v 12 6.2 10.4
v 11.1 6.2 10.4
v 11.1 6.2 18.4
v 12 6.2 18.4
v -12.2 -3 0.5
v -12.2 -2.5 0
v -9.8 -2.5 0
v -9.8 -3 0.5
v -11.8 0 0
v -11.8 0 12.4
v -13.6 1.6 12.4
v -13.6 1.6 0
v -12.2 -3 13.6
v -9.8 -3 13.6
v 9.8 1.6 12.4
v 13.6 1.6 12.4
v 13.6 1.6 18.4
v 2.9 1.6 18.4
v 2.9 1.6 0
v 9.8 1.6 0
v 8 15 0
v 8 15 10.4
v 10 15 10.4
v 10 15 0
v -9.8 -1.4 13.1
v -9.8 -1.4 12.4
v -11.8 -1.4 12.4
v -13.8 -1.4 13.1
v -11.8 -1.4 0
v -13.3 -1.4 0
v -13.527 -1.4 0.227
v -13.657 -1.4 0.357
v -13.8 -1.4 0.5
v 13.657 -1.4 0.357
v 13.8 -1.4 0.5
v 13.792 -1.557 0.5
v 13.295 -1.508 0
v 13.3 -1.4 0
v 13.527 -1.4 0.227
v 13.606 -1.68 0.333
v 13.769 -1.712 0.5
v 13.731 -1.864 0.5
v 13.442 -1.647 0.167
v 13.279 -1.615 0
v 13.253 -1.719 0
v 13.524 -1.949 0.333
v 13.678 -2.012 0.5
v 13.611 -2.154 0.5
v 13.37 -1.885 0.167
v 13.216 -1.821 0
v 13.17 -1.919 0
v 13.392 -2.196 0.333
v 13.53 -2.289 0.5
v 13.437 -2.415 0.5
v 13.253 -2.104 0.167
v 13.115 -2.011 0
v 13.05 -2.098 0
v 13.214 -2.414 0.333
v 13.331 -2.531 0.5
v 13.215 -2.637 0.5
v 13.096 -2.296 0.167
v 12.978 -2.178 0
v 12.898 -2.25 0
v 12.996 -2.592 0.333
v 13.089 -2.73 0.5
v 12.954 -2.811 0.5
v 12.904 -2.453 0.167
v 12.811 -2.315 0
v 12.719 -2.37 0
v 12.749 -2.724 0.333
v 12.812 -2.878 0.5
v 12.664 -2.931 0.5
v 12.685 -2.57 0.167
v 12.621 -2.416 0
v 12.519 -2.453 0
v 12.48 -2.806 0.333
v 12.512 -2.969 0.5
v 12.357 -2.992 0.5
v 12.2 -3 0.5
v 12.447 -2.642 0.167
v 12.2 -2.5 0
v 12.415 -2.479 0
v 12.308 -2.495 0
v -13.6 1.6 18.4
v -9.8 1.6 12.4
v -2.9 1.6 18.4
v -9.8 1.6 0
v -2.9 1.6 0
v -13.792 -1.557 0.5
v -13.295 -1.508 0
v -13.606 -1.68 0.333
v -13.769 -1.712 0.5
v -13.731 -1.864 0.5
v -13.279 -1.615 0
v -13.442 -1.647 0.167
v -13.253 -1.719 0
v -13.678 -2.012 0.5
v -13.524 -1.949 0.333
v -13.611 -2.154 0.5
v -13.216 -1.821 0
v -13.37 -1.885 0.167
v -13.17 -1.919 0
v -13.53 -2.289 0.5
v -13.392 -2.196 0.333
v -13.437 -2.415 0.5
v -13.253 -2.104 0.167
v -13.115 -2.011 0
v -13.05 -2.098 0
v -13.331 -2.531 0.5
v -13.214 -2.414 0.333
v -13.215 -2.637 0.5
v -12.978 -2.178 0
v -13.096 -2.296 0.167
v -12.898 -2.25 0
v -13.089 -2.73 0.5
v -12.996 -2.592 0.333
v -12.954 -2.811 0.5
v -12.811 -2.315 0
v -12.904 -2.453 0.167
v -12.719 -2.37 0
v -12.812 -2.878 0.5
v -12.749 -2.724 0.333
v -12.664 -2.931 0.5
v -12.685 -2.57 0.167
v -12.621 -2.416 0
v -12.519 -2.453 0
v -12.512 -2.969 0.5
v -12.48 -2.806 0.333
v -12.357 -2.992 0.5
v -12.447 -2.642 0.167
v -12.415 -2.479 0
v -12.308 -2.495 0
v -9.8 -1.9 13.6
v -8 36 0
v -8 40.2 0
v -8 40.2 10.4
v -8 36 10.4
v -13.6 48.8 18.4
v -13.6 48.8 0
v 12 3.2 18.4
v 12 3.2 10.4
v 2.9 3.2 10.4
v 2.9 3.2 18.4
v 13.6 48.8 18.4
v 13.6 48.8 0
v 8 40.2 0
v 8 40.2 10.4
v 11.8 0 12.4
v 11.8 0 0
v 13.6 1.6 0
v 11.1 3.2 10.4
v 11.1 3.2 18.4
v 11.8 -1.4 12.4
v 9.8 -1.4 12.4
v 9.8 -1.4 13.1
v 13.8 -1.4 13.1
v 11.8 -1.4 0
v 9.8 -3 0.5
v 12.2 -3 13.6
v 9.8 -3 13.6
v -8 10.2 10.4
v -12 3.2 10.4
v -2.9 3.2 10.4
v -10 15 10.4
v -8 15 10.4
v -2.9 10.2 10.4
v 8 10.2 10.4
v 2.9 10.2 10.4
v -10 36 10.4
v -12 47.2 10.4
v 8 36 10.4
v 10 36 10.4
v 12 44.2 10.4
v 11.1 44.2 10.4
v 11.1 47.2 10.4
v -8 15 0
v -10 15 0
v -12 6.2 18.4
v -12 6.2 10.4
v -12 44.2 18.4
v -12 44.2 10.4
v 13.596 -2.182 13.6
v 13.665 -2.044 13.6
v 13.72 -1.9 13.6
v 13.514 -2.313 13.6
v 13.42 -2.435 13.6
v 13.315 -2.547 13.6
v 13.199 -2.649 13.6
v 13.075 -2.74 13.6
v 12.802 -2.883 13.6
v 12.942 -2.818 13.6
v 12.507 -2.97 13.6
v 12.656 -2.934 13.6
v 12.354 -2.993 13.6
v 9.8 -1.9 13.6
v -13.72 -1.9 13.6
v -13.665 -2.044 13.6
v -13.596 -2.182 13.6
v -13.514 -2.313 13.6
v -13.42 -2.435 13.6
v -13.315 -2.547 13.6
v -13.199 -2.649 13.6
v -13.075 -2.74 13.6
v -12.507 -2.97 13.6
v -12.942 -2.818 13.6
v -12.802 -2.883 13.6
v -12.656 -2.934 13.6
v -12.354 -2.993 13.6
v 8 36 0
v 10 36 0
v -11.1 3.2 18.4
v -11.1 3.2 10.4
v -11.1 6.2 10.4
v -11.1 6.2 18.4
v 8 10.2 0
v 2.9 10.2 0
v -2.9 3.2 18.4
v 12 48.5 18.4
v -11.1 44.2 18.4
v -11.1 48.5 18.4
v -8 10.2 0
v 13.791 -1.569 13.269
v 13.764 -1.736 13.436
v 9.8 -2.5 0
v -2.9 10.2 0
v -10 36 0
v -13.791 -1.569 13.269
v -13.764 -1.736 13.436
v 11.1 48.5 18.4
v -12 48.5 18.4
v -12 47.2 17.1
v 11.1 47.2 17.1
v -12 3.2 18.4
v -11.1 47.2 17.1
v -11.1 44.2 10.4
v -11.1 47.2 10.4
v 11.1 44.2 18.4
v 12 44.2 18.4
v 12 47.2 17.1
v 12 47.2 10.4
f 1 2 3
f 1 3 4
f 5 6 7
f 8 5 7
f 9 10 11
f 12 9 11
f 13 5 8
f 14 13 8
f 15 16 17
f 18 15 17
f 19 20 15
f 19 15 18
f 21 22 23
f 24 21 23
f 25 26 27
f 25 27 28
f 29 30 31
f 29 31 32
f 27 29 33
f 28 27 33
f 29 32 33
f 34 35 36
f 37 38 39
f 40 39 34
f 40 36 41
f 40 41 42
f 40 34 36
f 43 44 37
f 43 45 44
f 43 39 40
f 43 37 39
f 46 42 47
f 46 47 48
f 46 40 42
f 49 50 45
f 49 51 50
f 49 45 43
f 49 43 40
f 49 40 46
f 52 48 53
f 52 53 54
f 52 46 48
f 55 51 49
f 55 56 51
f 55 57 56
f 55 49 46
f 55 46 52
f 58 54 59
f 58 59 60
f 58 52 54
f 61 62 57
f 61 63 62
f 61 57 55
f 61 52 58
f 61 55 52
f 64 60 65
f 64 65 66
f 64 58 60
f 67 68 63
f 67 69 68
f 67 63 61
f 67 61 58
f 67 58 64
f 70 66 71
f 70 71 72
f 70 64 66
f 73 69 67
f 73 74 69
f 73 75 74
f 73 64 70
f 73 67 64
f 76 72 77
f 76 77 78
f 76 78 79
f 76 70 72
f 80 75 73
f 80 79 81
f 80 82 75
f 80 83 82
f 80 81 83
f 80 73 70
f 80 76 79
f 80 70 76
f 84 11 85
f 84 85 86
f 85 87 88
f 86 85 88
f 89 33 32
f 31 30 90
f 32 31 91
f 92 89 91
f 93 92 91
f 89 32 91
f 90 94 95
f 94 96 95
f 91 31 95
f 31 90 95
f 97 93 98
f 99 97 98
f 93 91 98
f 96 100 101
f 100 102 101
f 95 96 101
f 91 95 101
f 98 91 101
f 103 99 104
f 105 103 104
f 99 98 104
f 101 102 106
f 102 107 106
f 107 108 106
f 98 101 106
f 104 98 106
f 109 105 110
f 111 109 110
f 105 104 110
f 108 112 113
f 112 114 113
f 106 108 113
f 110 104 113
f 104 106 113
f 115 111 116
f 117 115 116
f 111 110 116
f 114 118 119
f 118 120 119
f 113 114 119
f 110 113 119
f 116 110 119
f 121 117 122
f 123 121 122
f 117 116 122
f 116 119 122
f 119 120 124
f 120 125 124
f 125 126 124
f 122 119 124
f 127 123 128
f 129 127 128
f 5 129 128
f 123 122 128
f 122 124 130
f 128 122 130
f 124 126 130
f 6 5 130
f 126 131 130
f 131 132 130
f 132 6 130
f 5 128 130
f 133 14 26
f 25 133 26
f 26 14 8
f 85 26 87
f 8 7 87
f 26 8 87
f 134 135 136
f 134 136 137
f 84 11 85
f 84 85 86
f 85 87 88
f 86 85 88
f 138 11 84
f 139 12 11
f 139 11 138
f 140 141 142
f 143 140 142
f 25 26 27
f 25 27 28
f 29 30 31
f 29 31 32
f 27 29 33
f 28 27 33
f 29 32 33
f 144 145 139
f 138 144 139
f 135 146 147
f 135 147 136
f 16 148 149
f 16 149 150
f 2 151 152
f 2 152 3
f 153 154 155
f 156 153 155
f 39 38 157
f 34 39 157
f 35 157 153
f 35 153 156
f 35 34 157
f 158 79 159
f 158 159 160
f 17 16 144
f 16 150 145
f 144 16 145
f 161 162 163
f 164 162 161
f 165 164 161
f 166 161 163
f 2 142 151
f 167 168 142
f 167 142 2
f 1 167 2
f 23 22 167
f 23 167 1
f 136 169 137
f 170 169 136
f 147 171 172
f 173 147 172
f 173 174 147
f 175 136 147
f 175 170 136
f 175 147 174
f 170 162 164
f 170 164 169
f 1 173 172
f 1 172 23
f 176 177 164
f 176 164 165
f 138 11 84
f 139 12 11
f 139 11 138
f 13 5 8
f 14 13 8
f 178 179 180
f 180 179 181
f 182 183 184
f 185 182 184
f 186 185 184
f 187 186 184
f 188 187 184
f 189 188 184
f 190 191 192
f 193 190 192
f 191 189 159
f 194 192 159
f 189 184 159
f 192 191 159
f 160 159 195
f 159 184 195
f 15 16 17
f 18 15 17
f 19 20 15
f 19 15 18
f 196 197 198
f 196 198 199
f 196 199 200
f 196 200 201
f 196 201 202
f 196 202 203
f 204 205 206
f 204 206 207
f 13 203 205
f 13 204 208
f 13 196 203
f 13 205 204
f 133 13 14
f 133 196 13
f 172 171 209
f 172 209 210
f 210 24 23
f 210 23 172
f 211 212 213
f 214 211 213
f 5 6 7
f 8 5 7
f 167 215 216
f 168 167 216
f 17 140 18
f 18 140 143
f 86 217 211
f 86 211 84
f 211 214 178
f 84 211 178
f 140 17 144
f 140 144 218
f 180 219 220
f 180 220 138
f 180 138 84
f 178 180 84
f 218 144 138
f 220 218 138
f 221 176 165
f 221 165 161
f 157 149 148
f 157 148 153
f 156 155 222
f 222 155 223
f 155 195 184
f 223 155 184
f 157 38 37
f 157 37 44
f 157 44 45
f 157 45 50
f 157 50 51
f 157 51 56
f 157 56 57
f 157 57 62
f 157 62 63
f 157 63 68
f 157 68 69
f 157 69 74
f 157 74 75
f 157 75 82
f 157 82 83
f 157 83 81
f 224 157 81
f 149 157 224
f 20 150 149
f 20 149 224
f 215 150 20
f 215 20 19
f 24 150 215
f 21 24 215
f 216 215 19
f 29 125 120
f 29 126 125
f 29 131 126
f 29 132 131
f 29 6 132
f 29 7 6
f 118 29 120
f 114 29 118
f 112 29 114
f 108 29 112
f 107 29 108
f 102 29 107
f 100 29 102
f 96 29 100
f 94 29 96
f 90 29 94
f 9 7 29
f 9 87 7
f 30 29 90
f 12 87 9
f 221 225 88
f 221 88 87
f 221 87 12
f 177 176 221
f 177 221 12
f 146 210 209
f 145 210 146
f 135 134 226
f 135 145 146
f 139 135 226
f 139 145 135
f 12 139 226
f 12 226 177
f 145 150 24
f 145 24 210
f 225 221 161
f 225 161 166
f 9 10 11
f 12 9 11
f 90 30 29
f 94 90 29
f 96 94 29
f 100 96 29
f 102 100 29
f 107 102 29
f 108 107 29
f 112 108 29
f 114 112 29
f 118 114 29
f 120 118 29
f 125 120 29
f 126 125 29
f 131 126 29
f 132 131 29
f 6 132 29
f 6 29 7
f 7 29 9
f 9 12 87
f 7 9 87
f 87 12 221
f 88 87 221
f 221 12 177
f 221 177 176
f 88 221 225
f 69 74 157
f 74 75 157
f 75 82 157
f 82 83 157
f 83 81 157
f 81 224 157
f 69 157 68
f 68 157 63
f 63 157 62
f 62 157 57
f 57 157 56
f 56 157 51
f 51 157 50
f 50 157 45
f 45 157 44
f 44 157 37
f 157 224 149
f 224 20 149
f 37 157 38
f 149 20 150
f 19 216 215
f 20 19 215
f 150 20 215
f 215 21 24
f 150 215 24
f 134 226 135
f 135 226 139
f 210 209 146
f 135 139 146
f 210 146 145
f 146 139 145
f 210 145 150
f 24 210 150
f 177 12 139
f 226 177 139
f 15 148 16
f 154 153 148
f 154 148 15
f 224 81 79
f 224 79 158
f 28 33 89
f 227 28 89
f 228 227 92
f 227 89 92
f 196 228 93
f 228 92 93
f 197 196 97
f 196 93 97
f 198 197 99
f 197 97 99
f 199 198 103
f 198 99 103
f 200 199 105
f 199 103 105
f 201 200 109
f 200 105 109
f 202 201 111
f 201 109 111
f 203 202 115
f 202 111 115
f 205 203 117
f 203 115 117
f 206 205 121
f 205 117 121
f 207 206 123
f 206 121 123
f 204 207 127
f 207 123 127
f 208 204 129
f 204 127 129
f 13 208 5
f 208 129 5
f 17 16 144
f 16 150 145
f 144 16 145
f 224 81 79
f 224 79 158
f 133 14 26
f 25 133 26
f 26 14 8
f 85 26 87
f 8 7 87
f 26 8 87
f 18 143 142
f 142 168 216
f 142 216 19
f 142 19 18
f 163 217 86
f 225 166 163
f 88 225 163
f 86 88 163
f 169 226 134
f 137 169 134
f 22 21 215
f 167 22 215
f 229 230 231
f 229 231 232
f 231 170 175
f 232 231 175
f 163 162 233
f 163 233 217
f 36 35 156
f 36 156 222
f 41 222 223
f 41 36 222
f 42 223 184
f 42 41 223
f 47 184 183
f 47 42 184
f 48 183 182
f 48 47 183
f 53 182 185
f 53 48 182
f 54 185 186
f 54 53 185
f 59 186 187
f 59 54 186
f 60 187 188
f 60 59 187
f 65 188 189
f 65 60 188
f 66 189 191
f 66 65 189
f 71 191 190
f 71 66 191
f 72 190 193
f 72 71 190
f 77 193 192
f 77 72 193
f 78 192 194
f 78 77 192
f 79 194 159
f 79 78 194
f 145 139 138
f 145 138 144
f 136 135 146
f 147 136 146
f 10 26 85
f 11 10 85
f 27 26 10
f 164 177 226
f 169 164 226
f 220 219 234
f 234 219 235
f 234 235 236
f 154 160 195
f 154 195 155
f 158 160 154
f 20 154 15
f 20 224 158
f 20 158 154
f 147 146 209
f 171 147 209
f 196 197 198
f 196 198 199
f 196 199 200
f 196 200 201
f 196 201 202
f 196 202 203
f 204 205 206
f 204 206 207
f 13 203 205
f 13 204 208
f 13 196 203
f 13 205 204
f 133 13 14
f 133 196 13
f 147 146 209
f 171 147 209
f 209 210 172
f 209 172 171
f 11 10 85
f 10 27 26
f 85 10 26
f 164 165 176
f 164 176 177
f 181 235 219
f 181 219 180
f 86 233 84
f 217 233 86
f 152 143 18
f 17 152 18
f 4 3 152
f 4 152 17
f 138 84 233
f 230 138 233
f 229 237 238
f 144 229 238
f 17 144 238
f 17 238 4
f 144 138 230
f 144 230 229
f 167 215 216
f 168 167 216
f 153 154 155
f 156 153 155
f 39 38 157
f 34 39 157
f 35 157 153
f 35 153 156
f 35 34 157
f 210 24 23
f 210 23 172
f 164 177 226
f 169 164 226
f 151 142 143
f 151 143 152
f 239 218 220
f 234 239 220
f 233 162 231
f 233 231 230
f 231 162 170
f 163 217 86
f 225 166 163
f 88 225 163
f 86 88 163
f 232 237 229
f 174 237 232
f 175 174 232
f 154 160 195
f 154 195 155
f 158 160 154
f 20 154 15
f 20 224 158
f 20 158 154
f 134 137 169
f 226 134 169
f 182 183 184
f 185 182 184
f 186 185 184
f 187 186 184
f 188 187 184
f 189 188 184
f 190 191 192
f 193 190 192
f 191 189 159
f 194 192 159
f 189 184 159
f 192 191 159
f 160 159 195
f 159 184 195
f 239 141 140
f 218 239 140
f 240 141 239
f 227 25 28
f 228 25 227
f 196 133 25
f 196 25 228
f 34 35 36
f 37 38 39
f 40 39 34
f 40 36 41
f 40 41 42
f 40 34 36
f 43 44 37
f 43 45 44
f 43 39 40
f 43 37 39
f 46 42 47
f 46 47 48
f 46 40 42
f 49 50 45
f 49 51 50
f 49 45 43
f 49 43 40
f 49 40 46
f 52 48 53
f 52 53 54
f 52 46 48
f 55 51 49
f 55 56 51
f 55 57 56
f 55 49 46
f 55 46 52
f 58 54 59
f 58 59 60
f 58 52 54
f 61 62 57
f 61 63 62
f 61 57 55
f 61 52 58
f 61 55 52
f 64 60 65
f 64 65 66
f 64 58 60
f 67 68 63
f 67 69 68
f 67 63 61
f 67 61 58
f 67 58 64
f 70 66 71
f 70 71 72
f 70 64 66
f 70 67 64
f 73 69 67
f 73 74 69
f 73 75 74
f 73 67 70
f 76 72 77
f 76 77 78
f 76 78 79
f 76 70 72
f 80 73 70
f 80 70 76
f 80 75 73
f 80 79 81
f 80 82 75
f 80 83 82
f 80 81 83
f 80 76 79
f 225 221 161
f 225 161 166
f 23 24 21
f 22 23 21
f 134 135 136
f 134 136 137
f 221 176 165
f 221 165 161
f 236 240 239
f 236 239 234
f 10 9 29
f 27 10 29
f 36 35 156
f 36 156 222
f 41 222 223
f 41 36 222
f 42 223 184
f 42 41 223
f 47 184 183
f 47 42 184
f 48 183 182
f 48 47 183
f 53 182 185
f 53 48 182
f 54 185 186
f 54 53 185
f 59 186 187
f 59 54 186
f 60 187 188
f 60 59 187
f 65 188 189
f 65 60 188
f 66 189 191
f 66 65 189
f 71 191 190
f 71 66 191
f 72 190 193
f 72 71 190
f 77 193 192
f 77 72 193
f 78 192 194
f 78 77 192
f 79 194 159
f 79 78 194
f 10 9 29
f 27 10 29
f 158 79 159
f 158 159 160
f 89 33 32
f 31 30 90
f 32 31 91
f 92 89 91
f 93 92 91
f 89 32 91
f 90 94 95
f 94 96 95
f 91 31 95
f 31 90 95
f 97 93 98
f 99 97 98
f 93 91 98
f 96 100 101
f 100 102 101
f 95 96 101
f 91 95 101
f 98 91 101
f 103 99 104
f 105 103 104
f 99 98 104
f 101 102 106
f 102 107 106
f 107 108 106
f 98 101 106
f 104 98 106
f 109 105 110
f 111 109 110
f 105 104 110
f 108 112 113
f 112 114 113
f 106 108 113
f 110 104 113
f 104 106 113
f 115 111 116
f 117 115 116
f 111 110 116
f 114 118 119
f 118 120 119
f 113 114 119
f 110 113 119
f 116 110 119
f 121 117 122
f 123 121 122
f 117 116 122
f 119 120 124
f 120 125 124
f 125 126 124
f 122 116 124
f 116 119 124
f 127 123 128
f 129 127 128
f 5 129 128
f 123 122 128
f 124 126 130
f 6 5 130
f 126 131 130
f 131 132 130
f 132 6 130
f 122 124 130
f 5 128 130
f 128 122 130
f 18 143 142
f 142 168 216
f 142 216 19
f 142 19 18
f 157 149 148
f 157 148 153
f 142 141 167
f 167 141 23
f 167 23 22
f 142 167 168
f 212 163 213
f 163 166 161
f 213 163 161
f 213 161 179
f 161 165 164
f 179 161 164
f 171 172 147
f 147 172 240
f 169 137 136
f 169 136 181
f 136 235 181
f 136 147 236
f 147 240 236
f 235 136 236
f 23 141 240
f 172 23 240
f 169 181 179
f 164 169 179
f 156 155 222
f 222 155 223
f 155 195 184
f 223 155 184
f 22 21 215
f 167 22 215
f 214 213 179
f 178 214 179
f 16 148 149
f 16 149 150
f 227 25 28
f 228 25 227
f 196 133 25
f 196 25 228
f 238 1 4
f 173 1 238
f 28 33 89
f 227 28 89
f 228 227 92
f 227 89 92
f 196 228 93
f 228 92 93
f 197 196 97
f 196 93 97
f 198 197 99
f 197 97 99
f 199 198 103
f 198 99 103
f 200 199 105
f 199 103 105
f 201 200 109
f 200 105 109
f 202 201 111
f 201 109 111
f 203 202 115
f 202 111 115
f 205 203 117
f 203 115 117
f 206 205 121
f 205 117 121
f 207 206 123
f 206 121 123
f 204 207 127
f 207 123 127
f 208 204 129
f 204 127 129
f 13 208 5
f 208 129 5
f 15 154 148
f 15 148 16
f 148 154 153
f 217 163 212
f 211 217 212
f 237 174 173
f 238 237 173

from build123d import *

# Parameters (mm, degrees)
PAD_DEPTH       = 18.4
BOX_W           = 100
BOX_H           = 10
BOX_DEPTH       = 10
BOX001_W        = 24
BOX001_H        = 44
BOX001_DEPTH    = 100
BOX002_W        = 20
BOX002_H        = 21
BOX002_DEPTH    = 100
PAD001_DEPTH    = 1.2
BOX003_W        = 1.1
BOX003_H        = 3
BOX003_DEPTH    = 8
BOX004_W        = 1.1
BOX004_H        = 3
BOX004_DEPTH    = 8
CHAMFER_SIZE    = 1.3
CHAMFER001_SIZE = 0.5
CHAMFER002_SIZE = 0.5


with BuildPart() as body:
    # Sketch → Pad (new body)
    with BuildSketch(Plane.XY):
        with BuildLine():
            Line((-11.8, 0), (-11.8, -1.4))
            Line((-11.8, -1.4), (-13.8, -1.4))
            ThreePointArc((-13.8, -1.4), (-13.331371, -2.531371), (-12.2, -3))
            Line((-12.2, -3), (-9.8, -3))
            Line((-9.8, -3), (-9.8, 1.6))
            Line((-9.8, 1.6), (-2.9, 1.6))
            Line((-2.9, 10.2), (-2.9, 1.6))
            Line((-8, 10.2), (-2.9, 10.2))
            Line((-8, 40.2), (-8, 10.2))
            Line((0, 40.2), (-8, 40.2))
            Line((0, 48.8), (0, 40.2))
            Line((-13.6, 48.8), (0, 48.8))
            Line((-13.6, 1.6), (-13.6, 48.8))
            Line((-11.8, 0), (-13.6, 1.6))
        make_face()
    pad = extrude(amount=PAD_DEPTH)

    # Mirrored: Pad across Sketch V_Axis
    add(pad.mirror(Plane(origin=(0, 0, 0), x_dir=(0, 0, 1), z_dir=(1, 0, 0))))

    # Box → Box (cut)
    with BuildSketch(Plane(origin=(50, 1.6, 12.4), x_dir=(-1, 0, 0), z_dir=(0, 0, 1))):
        with Locations((50, 5)):
            Rectangle(BOX_W, BOX_H)
    extrude(amount=BOX_DEPTH, mode=Mode.SUBTRACT)

    # Box001 → Box001 (cut)
    with BuildSketch(Plane(origin=(-12, 3.2, 10.4), x_dir=(1, 0, 0), z_dir=(0, 0, 1))):
        with Locations((12, 22)):
            Rectangle(BOX001_W, BOX001_H)
    extrude(amount=BOX001_DEPTH, mode=Mode.SUBTRACT)

    # Box002 → Box002 (cut)
    with BuildSketch(Plane(origin=(-10, 15, 0), x_dir=(1, 0, 0), z_dir=(0, 0, 1))):
        with Locations((10, 10.5)):
            Rectangle(BOX002_W, BOX002_H)
    extrude(amount=BOX002_DEPTH, mode=Mode.SUBTRACT)

    # Sketch001 → Pad001 (join)
    with BuildSketch(Plane.XY.offset(12.4)):
        with BuildLine():
            Line((-11.8, -1.4), (-13.8, -1.4))
            ThreePointArc((-13.8, -1.4), (-13.331371, -2.531371), (-12.2, -3))
            Line((-12.2, -3), (-9.8, -3))
            Line((-9.8, -3), (-9.8, -1.4))
            Line((-9.8, -1.4), (-11.8, -1.4))
        make_face()
    pad001 = extrude(amount=PAD001_DEPTH)

    # Mirrored001: Pad001 across Sketch001 V_Axis
    add(pad001.mirror(Plane(origin=(0, 0, 12.4), x_dir=(0, 0, 1), z_dir=(1, 0, 0))))

    # Box003 → Box003 (join)
    with BuildSketch(Plane(origin=(11.1, 3.2, 10.4), x_dir=(1, 0, 0), z_dir=(0, 0, 1))):
        with Locations((0.55, 1.5)):
            Rectangle(BOX003_W, BOX003_H)
    extrude(amount=BOX003_DEPTH)

    # Box004 → Box004 (join)
    with BuildSketch(Plane(origin=(11.1, 44.2, 10.4), x_dir=(1, 0, 0), z_dir=(0, 0, 1))):
        with Locations((0.55, 1.5)):
            Rectangle(BOX004_W, BOX004_H)
    extrude(amount=BOX004_DEPTH)

    # Chamfer
    chamfer_edges = [body.edges().sort_by_distance(p)[0] for p in [
        (-6, 47.2, 18.4),
        (5.55, 47.2, 18.4),
    ]]
    chamfer(chamfer_edges, length=CHAMFER_SIZE)

    # Chamfer001
    chamfer001_edges = [body.edges().sort_by_distance(p)[0] for p in [
        (-11, -3, 0),
        (11, -3, 0),
    ]]
    chamfer(chamfer001_edges, length=CHAMFER001_SIZE)

    # Chamfer002
    chamfer002_edges = [body.edges().sort_by_distance(p)[0] for p in [
        (10.8, -1.4, 13.6),
        (-10.8, -1.4, 13.6),
    ]]
    chamfer(chamfer002_edges, length=CHAMFER002_SIZE)


with BuildPart() as hub_bottom:
    # Body001 base: copy of Body
    add(body.part)


with BuildPart() as hub_top:
    # Mirror: instance of Body
    add(body.part.mirror(Plane(origin=(0, 0, 0), x_dir=(0, -1, 0), z_dir=(1, 0, 0))))


solid = Compound([hub_bottom.part, hub_top.part])
